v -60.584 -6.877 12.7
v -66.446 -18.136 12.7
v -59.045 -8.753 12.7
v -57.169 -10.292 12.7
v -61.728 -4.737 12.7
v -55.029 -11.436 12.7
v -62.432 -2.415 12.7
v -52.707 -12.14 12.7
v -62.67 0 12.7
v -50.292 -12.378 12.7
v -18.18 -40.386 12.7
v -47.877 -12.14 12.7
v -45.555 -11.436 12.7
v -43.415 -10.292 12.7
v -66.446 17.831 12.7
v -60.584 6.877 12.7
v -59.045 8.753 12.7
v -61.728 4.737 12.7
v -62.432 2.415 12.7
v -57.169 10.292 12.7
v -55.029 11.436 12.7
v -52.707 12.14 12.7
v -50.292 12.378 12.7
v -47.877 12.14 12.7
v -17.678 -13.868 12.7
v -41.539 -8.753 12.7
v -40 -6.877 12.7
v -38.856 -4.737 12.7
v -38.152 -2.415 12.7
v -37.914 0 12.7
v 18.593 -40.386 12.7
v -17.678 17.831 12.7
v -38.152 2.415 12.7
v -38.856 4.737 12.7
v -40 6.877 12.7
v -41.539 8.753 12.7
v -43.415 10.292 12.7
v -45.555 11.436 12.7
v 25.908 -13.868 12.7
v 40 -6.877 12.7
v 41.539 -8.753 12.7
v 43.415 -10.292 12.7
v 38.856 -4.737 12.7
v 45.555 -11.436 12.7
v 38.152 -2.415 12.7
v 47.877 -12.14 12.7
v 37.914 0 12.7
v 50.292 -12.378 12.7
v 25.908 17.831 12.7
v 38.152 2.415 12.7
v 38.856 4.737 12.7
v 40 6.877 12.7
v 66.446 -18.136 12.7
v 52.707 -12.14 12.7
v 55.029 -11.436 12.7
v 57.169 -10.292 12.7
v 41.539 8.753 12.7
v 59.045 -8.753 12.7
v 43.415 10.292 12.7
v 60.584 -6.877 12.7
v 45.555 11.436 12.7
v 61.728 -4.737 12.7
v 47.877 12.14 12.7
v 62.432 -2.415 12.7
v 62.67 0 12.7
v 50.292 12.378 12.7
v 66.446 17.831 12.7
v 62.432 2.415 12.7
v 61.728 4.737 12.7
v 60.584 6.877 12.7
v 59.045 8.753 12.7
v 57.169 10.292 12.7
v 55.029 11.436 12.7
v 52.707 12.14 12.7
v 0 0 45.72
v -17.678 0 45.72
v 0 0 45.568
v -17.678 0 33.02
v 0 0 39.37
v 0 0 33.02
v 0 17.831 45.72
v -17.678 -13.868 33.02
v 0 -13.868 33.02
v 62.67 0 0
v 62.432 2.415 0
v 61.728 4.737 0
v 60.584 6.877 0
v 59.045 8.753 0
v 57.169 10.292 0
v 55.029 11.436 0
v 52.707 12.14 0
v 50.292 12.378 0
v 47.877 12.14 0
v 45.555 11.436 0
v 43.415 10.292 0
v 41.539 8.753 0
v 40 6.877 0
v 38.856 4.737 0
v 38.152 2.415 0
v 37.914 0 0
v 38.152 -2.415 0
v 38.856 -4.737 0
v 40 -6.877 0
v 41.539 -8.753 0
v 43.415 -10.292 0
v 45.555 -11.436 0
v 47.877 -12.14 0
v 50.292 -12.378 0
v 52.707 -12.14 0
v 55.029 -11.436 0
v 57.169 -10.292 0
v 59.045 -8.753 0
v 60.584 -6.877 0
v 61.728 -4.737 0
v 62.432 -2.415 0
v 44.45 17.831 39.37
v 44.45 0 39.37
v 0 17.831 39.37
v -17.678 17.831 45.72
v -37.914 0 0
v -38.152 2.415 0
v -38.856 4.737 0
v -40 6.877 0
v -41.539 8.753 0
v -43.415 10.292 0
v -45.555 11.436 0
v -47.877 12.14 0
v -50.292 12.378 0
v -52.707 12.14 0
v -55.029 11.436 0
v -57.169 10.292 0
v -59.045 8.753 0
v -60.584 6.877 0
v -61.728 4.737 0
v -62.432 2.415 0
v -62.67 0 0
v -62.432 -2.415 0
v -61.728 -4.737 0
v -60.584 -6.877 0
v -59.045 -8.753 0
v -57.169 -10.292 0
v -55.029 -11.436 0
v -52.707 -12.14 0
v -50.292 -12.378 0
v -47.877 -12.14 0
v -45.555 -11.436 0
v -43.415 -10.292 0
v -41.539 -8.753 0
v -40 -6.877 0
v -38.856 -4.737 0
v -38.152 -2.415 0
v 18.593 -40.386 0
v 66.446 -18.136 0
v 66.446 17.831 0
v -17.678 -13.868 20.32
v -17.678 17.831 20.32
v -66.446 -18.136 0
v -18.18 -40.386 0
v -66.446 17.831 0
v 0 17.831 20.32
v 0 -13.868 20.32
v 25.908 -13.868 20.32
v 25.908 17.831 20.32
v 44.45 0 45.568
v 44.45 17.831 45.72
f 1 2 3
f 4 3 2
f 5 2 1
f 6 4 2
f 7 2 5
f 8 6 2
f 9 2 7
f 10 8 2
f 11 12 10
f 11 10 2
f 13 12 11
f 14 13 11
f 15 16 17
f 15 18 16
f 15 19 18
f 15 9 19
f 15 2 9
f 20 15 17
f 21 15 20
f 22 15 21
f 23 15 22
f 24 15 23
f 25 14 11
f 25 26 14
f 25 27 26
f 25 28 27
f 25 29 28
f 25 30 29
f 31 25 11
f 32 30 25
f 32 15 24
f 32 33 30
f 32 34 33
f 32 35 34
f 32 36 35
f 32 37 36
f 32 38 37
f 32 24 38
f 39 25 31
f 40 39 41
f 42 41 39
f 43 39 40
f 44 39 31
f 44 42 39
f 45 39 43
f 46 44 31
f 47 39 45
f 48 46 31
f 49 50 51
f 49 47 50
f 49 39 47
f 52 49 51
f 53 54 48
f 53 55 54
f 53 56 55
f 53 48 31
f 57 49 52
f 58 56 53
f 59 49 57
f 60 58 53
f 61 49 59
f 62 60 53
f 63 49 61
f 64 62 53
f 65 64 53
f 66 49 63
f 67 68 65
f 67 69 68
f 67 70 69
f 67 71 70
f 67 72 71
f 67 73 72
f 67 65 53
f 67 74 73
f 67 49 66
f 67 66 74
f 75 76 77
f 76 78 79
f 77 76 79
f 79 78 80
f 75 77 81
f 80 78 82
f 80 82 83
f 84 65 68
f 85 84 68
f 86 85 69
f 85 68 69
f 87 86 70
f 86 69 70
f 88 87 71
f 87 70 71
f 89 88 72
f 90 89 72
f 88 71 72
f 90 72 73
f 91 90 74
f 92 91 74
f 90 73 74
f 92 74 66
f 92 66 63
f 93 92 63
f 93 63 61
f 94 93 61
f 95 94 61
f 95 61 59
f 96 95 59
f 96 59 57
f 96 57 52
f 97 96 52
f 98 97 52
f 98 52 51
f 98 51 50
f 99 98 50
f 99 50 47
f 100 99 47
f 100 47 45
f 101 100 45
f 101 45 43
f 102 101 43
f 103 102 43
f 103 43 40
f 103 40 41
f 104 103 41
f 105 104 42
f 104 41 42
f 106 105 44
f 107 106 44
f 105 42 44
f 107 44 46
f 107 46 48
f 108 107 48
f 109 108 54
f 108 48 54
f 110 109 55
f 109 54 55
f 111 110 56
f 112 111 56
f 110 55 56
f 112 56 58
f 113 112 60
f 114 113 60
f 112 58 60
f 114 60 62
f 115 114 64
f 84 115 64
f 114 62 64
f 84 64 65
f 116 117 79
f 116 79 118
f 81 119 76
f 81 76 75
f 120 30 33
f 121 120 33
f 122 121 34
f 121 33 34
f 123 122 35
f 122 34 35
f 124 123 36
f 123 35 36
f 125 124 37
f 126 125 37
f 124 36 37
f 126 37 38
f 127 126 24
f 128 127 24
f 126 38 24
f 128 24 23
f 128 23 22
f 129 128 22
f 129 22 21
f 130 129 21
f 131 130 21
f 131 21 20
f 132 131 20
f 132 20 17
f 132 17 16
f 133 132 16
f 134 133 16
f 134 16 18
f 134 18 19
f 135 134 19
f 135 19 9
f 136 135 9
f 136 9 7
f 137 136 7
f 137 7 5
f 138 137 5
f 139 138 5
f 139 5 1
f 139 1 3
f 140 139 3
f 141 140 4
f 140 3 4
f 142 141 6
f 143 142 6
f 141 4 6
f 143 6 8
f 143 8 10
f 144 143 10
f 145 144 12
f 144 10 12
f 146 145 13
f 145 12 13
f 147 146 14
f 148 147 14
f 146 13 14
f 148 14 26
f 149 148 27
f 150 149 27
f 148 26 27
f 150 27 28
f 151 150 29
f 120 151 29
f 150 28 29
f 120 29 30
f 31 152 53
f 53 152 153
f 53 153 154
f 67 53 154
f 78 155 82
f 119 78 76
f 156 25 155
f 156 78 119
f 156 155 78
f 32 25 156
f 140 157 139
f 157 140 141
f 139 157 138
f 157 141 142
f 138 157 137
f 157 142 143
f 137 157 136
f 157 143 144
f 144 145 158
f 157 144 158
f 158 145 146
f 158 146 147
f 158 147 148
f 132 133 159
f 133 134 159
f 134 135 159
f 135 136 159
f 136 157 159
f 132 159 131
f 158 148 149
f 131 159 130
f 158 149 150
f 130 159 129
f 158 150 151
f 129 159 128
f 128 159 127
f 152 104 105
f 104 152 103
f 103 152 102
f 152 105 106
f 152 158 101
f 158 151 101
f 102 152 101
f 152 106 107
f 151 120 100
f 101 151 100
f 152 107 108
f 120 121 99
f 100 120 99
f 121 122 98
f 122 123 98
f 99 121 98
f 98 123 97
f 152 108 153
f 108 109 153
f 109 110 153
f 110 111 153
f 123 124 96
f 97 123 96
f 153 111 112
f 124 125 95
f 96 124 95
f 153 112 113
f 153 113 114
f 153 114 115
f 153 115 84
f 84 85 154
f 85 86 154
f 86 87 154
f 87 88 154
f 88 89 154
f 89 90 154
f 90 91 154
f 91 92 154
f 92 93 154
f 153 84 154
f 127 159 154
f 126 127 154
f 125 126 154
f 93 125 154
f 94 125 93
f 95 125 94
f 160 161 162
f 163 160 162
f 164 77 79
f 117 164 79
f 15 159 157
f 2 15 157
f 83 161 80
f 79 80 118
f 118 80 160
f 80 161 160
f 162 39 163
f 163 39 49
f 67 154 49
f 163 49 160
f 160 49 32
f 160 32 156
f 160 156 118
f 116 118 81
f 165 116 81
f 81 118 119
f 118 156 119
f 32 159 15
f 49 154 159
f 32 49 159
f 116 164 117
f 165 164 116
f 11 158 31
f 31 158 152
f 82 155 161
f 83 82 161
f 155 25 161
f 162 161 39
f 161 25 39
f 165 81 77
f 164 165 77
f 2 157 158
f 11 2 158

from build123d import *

# Parameters (mm, degrees)
F1_DEPTH  = 12.7
F2_R      = 12.3782206299
F3_DEPTH  = 25.4
F4_W      = 43.5863994062
F4_H      = 31.6992001608
F5_DEPTH  = 7.62
F6_W      = 17.6784005016
F6_H      = 13.8683998957
F7_DEPTH  = 12.7
F8_W      = 17.6784005016
F8_H      = 17.8308002651
F9_DEPTH  = 25.4
F11_DEPTH = 44.45


with BuildPart() as f1:
    # F0 (on Top) → F1 (new body)
    with BuildSketch(Plane.XY):
        Polygon((-66.4464011788, -18.1356016546), (-18.1801488484, -40.3860025108), (18.592800945, -40.3860025108), (66.4464011788, -18.1356016546), (66.4464011788, 17.8308002651), (-66.4464011788, 17.8308002651), align=None)
    extrude(amount=F1_DEPTH)

    # F2 (on face) → F3 (cut)
    with BuildSketch(Plane.XY.offset(12.7)):
        with Locations((50.2920001745, 0)):
            Circle(F2_R)
        with Locations((-50.2920001745, 0)):
            Circle(F2_R)
    extrude(amount=-F3_DEPTH, mode=Mode.SUBTRACT)

    # F4 (on face) → F5 (join)
    with BuildSketch(Plane.XY.offset(12.7)):
        with Locations((4.1147992015, 1.9812001847)):
            Rectangle(F4_W, F4_H)
    extrude(amount=F5_DEPTH)

    # F6 (on face) → F7 (join)
    with BuildSketch(Plane.XY.offset(20.32)):
        with Locations((-8.8392002508, -6.9341999479)):
            Rectangle(F6_W, F6_H)
    extrude(amount=F7_DEPTH)

    # F8 (on face) → F9 (join)
    with BuildSketch(Plane.XY.offset(20.32)):
        with Locations((-8.8392002508, 8.9154001325)):
            Rectangle(F8_W, F8_H)
    extrude(amount=F9_DEPTH)

    # F10 (on face) → F11 (join)
    with BuildSketch(Plane.YZ):
        Polygon((-1.0628e-06, 45.5676019192), (0, 39.37), (17.8308002651, 39.37), (17.8308002651, 45.72), align=None)
    extrude(amount=F11_DEPTH)


solid = f1.part
